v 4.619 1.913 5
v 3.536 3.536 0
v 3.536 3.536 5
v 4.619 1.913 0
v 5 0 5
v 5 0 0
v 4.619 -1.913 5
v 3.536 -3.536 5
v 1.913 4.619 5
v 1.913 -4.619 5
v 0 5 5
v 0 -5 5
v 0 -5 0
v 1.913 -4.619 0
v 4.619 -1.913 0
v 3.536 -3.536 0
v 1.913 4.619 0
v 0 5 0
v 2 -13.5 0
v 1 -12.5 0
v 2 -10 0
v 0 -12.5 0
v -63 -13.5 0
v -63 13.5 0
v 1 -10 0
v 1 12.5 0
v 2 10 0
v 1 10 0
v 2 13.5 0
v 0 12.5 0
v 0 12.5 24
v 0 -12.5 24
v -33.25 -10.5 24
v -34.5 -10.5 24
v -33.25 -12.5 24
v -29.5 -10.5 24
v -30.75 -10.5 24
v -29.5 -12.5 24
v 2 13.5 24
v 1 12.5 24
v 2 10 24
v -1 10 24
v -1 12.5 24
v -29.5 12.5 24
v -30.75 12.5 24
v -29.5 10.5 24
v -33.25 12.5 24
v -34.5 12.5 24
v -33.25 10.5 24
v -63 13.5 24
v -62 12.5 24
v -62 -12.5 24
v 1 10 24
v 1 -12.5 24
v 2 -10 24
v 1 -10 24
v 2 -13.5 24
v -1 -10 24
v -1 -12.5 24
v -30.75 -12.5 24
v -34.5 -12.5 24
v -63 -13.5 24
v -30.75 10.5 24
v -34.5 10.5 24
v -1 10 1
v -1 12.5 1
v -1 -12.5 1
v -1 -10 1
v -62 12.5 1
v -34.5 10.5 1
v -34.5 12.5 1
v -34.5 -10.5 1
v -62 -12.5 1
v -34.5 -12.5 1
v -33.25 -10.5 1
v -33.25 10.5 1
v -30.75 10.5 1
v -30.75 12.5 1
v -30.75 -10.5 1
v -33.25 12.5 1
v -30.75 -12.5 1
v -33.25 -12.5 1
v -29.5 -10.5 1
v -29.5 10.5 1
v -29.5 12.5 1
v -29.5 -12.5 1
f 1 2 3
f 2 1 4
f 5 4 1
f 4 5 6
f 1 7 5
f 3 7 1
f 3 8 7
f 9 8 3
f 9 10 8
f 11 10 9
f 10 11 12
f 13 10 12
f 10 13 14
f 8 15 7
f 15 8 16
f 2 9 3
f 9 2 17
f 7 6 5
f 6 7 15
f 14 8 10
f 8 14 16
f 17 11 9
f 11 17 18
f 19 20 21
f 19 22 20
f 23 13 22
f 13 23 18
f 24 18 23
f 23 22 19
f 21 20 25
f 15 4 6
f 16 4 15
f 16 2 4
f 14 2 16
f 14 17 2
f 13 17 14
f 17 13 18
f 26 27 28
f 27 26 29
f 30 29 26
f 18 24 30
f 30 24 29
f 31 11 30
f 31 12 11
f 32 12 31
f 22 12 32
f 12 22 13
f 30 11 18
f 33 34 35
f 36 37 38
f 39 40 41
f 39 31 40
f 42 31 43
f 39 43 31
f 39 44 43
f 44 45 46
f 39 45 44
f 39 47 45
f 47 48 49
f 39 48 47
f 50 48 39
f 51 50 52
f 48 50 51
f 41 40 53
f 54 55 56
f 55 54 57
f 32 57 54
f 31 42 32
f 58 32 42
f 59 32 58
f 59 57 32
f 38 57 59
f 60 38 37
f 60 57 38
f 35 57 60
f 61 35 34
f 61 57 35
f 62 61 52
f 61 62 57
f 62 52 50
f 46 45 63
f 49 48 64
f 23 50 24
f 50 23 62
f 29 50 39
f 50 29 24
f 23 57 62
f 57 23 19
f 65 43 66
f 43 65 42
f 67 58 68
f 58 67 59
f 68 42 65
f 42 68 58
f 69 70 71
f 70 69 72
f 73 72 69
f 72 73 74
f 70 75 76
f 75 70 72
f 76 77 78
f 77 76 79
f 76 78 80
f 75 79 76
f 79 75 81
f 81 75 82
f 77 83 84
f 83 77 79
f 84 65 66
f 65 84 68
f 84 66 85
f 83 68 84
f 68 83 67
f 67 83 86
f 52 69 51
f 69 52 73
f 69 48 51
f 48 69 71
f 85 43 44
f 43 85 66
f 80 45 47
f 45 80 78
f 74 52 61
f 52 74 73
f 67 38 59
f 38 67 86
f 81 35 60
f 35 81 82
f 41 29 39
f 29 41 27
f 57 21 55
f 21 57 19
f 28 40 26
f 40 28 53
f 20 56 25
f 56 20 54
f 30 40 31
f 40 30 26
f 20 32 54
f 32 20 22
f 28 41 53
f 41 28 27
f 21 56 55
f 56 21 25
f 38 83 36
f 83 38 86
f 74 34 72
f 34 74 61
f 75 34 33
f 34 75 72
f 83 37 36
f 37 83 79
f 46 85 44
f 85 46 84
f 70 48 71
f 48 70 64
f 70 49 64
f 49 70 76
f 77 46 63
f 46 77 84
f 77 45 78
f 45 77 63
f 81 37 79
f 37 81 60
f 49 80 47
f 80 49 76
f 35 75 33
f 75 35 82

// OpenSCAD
//Box type 
box_type = 1; //[0:Half Height, 1:Standard, 2:Double, 3:Quad]

//Rack depth (no more than your max Z height!)
depth = 64;

//With divider slots?
divider = 1; //[0:No, 1:Yes]

//Render drawer or divider panel?
panel = 0; // [0:Box, 1:Panel]




//finger pull
if (panel == 0) {
	difference() {
		cylinder(h=5, r=5);
		translate(v=[-5,0,0]) {
			cube(size=[10,10,10], center=true);
		}
	}
}


if (box_type == 0) {
	if (panel == 0) {
		translate(v=[-depth/2+0.5,0,11.5/2]) {
			difference() {
				cube(size=[depth-1,27,11.5], center=true);
				translate(v=[0,0,0.5]){
					cube(size=[depth-3,25,10.5], center=true);
				}
			}
		}
	translate(v=[0.5,0,5.75]) {
			difference() {
				cube(size=[3,27,11.5], center=true);
				cube(size=[1,25,11.5], center=true);
				cube(size=[3,20,11.5], center=true);
			}
		}
	}

	if (divider == 1) {
		if (panel == 0) {
			difference() {
				union() {
					translate(v=[-depth/2,-27/2+2,11.5/2]) {
						cube(size=[5,2,11.5], center = true);
					}
					translate(v=[-depth/2,27/2-2,11.5/2]) {
						cube(size=[5,2,11.5], center = true);
					}
				}
				translate(v=[-depth/2,0,11.5/2]) {
						cube(size=[2.5,25,11.5], center = true);
				}
			}
		}
		if (panel == 1) {
				cube(size=[24,10,2], center=true);
		}
	}
}






if (box_type == 1) {
	if (panel == 0) {
		translate(v=[-depth/2+0.5,0,24/2]) {
			difference() {
				cube(size=[depth-1,27,24], center=true);
				translate(v=[0,0,0.5]){
					cube(size=[depth-3,25,23], center=true);
				}
			}
		}
		translate(v=[0.5,0,12]) {
			difference() {
				cube(size=[3,27,24], center=true);
				cube(size=[1,25,24], center=true);
				cube(size=[3,20,24], center=true);
			}
		}
	}

	if (divider == 1) {
		if (panel == 0) {
			difference() {
				union() {
					translate(v=[-depth/2,-27/2+2,12]) {
						cube(size=[5,2,24], center = true);
					}
					translate(v=[-depth/2,27/2-2,12]) {
						cube(size=[5,2,24], center = true);
					}
				}
				translate(v=[-depth/2,0,12]) {
					cube(size=[2.5,25,24], center = true);
				}
			}
		}
		if (panel == 1) {
			cube(size=[24,23,2], center=true);
		}
	}
}







if (box_type == 2) {
	if (panel == 0) {
		translate(v=[-depth/2+0.5,0,24/2]) {
			difference() {
				cube(size=[depth-1,57,24], center=true);
				translate(v=[0,0,0.5]){
					cube(size=[depth-3,55,23], center=true);
				}
			}
		}
		translate(v=[0.5,0,12]) {
			difference() {
				cube(size=[3,57,24], center=true);
				cube(size=[1,55,24], center=true);
				cube(size=[3,50,24], center=true);
			}
		}
	}

	if (divider == 1) {
		if (panel == 0) {
			difference() {
				union() {
					translate(v=[-depth/2,-57/2+2,12]) {
						cube(size=[5,2,24], center = true);
					}
					translate(v=[-depth/2,57/2-2,12]) {
						cube(size=[5,2,24], center = true);
					}
				}
				translate(v=[-depth/2,0,12]) {
					cube(size=[2.5,55,24], center = true);
				}
			}
		}
		if (panel == 1) {
			cube(size=[24,54,2], center=true);
		}
	}
}





if (box_type == 3 ) {
	if (panel == 0) {
		translate(v=[-depth/2+0.5,0,24/2]) {
			difference() {
				cube(size=[depth-1,115,24], center=true);
				translate(v=[0,0,0.5]){
					cube(size=[depth-3,113,23], center=true);
				}
			}
		}
		translate(v=[0.5,0,12]) {
			difference() {
				cube(size=[3,57,24], center=true);
				cube(size=[1,55,24], center=true);
				cube(size=[3,50,24], center=true);
			}
		}
	}

	if (divider == 1) {
		if (panel == 0) {
			difference() {
				union() {
					translate(v=[-depth/2,-115/2+2,12]) {
						cube(size=[5,2,24], center = true);
					}
					translate(v=[-depth/2,115/2-2,12]) {
						cube(size=[5,2,24], center = true);
					}
				}
				translate(v=[-depth/2,0,12]) {
					cube(size=[2.5,113,24], center = true);
				}
			}
		}
		if (panel == 1) {
			cube(size=[24,112,2], center=true);
		}
	}
}
